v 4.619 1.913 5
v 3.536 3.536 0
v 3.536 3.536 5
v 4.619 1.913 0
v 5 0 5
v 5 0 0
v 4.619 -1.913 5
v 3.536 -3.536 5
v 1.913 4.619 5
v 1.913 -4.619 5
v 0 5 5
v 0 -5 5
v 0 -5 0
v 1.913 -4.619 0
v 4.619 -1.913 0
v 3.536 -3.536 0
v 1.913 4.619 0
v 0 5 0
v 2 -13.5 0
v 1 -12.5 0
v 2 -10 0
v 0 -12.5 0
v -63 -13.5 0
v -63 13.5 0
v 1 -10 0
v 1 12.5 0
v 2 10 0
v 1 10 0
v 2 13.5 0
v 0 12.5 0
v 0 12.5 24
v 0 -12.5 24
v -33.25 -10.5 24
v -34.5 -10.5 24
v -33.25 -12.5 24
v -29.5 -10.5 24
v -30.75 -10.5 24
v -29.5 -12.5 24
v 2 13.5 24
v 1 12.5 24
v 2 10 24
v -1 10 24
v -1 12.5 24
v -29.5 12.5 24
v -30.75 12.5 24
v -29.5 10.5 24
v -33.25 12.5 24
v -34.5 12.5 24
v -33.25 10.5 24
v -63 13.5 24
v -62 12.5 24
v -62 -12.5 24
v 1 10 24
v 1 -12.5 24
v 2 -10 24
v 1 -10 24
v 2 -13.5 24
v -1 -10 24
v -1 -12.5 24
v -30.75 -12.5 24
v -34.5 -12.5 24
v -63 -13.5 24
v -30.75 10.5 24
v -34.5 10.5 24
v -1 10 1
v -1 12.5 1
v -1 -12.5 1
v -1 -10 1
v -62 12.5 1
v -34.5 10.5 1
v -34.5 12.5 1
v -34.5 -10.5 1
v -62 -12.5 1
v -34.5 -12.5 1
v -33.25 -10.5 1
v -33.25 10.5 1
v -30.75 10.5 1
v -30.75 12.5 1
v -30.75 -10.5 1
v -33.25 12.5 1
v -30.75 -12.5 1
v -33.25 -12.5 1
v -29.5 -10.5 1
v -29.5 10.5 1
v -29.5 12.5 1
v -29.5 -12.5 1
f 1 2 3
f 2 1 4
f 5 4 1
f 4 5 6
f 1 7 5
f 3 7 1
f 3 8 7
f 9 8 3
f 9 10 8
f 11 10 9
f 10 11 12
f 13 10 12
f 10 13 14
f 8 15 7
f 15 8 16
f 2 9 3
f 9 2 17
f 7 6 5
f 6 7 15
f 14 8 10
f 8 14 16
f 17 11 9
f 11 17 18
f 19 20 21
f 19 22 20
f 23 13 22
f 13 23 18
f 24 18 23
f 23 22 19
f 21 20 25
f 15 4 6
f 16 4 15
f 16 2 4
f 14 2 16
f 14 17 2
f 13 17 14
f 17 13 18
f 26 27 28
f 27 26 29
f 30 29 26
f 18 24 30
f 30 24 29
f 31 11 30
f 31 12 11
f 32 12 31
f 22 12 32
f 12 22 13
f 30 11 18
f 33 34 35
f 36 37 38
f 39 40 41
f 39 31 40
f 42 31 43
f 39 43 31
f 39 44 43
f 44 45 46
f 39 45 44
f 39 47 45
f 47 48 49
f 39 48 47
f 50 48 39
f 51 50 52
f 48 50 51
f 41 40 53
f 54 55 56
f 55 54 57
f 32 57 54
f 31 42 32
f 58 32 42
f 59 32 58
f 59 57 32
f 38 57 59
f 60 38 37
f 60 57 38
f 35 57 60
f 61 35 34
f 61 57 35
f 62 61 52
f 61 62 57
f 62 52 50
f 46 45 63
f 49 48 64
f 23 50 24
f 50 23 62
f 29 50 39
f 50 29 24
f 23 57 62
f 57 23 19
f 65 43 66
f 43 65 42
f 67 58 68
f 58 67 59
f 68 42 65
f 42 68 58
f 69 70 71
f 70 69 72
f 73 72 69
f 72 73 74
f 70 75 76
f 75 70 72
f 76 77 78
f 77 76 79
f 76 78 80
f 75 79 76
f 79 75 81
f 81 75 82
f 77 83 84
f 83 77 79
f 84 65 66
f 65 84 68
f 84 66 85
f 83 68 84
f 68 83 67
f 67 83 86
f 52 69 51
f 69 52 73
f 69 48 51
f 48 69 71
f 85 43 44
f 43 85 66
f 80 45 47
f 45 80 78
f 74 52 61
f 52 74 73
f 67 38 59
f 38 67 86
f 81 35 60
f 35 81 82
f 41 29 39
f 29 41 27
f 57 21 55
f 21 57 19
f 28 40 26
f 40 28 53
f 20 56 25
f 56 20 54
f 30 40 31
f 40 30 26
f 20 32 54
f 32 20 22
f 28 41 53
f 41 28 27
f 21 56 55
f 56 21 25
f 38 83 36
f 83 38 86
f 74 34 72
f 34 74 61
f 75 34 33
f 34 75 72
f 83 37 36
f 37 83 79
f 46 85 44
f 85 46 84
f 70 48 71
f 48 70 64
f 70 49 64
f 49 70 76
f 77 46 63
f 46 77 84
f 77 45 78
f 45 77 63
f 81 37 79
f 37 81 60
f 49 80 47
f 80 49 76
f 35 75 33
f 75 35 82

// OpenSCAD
//Box type 
box_type = 1; //[0:Half Height, 1:Standard, 2:Double, 3:Quad]

//Rack depth (no more than your max Z height!)
depth = 64;

//With divider slots?
divider = 1; //[0:No, 1:Yes]

//Render drawer or divider panel?
panel = 0; // [0:Box, 1:Panel]




//finger pull
if (panel == 0) {
	difference() {
		cylinder(h=5, r=5);
		translate(v=[-5,0,0]) {
			cube(size=[10,10,10], center=true);
		}
	}
}


if (box_type == 0) {
	if (panel == 0) {
		translate(v=[-depth/2+0.5,0,11.5/2]) {
			difference() {
				cube(size=[depth-1,27,11.5], center=true);
				translate(v=[0,0,0.5]){
					cube(size=[depth-3,25,10.5], center=true);
				}
			}
		}
	translate(v=[0.5,0,5.75]) {
			difference() {
				cube(size=[3,27,11.5], center=true);
				cube(size=[1,25,11.5], center=true);
				cube(size=[3,20,11.5], center=true);
			}
		}
	}

	if (divider == 1) {
		if (panel == 0) {
			difference() {
				union() {
					translate(v=[-depth/2,-27/2+2,11.5/2]) {
						cube(size=[5,2,11.5], center = true);
					}
					translate(v=[-depth/2,27/2-2,11.5/2]) {
						cube(size=[5,2,11.5], center = true);
					}
				}
				translate(v=[-depth/2,0,11.5/2]) {
						cube(size=[2.5,25,11.5], center = true);
				}
			}
		}
		if (panel == 1) {
				cube(size=[24,10,2], center=true);
		}
	}
}






if (box_type == 1) {
	if (panel == 0) {
		translate(v=[-depth/2+0.5,0,24/2]) {
			difference() {
				cube(size=[depth-1,27,24], center=true);
				translate(v=[0,0,0.5]){
					cube(size=[depth-3,25,23], center=true);
				}
			}
		}
		translate(v=[0.5,0,12]) {
			difference() {
				cube(size=[3,27,24], center=true);
				cube(size=[1,25,24], center=true);
				cube(size=[3,20,24], center=true);
			}
		}
	}

	if (divider == 1) {
		if (panel == 0) {
			difference() {
				union() {
					translate(v=[-depth/2,-27/2+2,12]) {
						cube(size=[5,2,24], center = true);
					}
					translate(v=[-depth/2,27/2-2,12]) {
						cube(size=[5,2,24], center = true);
					}
				}
				translate(v=[-depth/2,0,12]) {
					cube(size=[2.5,25,24], center = true);
				}
			}
		}
		if (panel == 1) {
			cube(size=[24,23,2], center=true);
		}
	}
}







if (box_type == 2) {
	if (panel == 0) {
		translate(v=[-depth/2+0.5,0,24/2]) {
			difference() {
				cube(size=[depth-1,57,24], center=true);
				translate(v=[0,0,0.5]){
					cube(size=[depth-3,55,23], center=true);
				}
			}
		}
		translate(v=[0.5,0,12]) {
			difference() {
				cube(size=[3,57,24], center=true);
				cube(size=[1,55,24], center=true);
				cube(size=[3,50,24], center=true);
			}
		}
	}

	if (divider == 1) {
		if (panel == 0) {
			difference() {
				union() {
					translate(v=[-depth/2,-57/2+2,12]) {
						cube(size=[5,2,24], center = true);
					}
					translate(v=[-depth/2,57/2-2,12]) {
						cube(size=[5,2,24], center = true);
					}
				}
				translate(v=[-depth/2,0,12]) {
					cube(size=[2.5,55,24], center = true);
				}
			}
		}
		if (panel == 1) {
			cube(size=[24,54,2], center=true);
		}
	}
}





if (box_type == 3 ) {
	if (panel == 0) {
		translate(v=[-depth/2+0.5,0,24/2]) {
			difference() {
				cube(size=[depth-1,115,24], center=true);
				translate(v=[0,0,0.5]){
					cube(size=[depth-3,113,23], center=true);
				}
			}
		}
		translate(v=[0.5,0,12]) {
			difference() {
				cube(size=[3,57,24], center=true);
				cube(size=[1,55,24], center=true);
				cube(size=[3,50,24], center=true);
			}
		}
	}

	if (divider == 1) {
		if (panel == 0) {
			difference() {
				union() {
					translate(v=[-depth/2,-115/2+2,12]) {
						cube(size=[5,2,24], center = true);
					}
					translate(v=[-depth/2,115/2-2,12]) {
						cube(size=[5,2,24], center = true);
					}
				}
				translate(v=[-depth/2,0,12]) {
					cube(size=[2.5,113,24], center = true);
				}
			}
		}
		if (panel == 1) {
			cube(size=[24,112,2], center=true);
		}
	}
}
